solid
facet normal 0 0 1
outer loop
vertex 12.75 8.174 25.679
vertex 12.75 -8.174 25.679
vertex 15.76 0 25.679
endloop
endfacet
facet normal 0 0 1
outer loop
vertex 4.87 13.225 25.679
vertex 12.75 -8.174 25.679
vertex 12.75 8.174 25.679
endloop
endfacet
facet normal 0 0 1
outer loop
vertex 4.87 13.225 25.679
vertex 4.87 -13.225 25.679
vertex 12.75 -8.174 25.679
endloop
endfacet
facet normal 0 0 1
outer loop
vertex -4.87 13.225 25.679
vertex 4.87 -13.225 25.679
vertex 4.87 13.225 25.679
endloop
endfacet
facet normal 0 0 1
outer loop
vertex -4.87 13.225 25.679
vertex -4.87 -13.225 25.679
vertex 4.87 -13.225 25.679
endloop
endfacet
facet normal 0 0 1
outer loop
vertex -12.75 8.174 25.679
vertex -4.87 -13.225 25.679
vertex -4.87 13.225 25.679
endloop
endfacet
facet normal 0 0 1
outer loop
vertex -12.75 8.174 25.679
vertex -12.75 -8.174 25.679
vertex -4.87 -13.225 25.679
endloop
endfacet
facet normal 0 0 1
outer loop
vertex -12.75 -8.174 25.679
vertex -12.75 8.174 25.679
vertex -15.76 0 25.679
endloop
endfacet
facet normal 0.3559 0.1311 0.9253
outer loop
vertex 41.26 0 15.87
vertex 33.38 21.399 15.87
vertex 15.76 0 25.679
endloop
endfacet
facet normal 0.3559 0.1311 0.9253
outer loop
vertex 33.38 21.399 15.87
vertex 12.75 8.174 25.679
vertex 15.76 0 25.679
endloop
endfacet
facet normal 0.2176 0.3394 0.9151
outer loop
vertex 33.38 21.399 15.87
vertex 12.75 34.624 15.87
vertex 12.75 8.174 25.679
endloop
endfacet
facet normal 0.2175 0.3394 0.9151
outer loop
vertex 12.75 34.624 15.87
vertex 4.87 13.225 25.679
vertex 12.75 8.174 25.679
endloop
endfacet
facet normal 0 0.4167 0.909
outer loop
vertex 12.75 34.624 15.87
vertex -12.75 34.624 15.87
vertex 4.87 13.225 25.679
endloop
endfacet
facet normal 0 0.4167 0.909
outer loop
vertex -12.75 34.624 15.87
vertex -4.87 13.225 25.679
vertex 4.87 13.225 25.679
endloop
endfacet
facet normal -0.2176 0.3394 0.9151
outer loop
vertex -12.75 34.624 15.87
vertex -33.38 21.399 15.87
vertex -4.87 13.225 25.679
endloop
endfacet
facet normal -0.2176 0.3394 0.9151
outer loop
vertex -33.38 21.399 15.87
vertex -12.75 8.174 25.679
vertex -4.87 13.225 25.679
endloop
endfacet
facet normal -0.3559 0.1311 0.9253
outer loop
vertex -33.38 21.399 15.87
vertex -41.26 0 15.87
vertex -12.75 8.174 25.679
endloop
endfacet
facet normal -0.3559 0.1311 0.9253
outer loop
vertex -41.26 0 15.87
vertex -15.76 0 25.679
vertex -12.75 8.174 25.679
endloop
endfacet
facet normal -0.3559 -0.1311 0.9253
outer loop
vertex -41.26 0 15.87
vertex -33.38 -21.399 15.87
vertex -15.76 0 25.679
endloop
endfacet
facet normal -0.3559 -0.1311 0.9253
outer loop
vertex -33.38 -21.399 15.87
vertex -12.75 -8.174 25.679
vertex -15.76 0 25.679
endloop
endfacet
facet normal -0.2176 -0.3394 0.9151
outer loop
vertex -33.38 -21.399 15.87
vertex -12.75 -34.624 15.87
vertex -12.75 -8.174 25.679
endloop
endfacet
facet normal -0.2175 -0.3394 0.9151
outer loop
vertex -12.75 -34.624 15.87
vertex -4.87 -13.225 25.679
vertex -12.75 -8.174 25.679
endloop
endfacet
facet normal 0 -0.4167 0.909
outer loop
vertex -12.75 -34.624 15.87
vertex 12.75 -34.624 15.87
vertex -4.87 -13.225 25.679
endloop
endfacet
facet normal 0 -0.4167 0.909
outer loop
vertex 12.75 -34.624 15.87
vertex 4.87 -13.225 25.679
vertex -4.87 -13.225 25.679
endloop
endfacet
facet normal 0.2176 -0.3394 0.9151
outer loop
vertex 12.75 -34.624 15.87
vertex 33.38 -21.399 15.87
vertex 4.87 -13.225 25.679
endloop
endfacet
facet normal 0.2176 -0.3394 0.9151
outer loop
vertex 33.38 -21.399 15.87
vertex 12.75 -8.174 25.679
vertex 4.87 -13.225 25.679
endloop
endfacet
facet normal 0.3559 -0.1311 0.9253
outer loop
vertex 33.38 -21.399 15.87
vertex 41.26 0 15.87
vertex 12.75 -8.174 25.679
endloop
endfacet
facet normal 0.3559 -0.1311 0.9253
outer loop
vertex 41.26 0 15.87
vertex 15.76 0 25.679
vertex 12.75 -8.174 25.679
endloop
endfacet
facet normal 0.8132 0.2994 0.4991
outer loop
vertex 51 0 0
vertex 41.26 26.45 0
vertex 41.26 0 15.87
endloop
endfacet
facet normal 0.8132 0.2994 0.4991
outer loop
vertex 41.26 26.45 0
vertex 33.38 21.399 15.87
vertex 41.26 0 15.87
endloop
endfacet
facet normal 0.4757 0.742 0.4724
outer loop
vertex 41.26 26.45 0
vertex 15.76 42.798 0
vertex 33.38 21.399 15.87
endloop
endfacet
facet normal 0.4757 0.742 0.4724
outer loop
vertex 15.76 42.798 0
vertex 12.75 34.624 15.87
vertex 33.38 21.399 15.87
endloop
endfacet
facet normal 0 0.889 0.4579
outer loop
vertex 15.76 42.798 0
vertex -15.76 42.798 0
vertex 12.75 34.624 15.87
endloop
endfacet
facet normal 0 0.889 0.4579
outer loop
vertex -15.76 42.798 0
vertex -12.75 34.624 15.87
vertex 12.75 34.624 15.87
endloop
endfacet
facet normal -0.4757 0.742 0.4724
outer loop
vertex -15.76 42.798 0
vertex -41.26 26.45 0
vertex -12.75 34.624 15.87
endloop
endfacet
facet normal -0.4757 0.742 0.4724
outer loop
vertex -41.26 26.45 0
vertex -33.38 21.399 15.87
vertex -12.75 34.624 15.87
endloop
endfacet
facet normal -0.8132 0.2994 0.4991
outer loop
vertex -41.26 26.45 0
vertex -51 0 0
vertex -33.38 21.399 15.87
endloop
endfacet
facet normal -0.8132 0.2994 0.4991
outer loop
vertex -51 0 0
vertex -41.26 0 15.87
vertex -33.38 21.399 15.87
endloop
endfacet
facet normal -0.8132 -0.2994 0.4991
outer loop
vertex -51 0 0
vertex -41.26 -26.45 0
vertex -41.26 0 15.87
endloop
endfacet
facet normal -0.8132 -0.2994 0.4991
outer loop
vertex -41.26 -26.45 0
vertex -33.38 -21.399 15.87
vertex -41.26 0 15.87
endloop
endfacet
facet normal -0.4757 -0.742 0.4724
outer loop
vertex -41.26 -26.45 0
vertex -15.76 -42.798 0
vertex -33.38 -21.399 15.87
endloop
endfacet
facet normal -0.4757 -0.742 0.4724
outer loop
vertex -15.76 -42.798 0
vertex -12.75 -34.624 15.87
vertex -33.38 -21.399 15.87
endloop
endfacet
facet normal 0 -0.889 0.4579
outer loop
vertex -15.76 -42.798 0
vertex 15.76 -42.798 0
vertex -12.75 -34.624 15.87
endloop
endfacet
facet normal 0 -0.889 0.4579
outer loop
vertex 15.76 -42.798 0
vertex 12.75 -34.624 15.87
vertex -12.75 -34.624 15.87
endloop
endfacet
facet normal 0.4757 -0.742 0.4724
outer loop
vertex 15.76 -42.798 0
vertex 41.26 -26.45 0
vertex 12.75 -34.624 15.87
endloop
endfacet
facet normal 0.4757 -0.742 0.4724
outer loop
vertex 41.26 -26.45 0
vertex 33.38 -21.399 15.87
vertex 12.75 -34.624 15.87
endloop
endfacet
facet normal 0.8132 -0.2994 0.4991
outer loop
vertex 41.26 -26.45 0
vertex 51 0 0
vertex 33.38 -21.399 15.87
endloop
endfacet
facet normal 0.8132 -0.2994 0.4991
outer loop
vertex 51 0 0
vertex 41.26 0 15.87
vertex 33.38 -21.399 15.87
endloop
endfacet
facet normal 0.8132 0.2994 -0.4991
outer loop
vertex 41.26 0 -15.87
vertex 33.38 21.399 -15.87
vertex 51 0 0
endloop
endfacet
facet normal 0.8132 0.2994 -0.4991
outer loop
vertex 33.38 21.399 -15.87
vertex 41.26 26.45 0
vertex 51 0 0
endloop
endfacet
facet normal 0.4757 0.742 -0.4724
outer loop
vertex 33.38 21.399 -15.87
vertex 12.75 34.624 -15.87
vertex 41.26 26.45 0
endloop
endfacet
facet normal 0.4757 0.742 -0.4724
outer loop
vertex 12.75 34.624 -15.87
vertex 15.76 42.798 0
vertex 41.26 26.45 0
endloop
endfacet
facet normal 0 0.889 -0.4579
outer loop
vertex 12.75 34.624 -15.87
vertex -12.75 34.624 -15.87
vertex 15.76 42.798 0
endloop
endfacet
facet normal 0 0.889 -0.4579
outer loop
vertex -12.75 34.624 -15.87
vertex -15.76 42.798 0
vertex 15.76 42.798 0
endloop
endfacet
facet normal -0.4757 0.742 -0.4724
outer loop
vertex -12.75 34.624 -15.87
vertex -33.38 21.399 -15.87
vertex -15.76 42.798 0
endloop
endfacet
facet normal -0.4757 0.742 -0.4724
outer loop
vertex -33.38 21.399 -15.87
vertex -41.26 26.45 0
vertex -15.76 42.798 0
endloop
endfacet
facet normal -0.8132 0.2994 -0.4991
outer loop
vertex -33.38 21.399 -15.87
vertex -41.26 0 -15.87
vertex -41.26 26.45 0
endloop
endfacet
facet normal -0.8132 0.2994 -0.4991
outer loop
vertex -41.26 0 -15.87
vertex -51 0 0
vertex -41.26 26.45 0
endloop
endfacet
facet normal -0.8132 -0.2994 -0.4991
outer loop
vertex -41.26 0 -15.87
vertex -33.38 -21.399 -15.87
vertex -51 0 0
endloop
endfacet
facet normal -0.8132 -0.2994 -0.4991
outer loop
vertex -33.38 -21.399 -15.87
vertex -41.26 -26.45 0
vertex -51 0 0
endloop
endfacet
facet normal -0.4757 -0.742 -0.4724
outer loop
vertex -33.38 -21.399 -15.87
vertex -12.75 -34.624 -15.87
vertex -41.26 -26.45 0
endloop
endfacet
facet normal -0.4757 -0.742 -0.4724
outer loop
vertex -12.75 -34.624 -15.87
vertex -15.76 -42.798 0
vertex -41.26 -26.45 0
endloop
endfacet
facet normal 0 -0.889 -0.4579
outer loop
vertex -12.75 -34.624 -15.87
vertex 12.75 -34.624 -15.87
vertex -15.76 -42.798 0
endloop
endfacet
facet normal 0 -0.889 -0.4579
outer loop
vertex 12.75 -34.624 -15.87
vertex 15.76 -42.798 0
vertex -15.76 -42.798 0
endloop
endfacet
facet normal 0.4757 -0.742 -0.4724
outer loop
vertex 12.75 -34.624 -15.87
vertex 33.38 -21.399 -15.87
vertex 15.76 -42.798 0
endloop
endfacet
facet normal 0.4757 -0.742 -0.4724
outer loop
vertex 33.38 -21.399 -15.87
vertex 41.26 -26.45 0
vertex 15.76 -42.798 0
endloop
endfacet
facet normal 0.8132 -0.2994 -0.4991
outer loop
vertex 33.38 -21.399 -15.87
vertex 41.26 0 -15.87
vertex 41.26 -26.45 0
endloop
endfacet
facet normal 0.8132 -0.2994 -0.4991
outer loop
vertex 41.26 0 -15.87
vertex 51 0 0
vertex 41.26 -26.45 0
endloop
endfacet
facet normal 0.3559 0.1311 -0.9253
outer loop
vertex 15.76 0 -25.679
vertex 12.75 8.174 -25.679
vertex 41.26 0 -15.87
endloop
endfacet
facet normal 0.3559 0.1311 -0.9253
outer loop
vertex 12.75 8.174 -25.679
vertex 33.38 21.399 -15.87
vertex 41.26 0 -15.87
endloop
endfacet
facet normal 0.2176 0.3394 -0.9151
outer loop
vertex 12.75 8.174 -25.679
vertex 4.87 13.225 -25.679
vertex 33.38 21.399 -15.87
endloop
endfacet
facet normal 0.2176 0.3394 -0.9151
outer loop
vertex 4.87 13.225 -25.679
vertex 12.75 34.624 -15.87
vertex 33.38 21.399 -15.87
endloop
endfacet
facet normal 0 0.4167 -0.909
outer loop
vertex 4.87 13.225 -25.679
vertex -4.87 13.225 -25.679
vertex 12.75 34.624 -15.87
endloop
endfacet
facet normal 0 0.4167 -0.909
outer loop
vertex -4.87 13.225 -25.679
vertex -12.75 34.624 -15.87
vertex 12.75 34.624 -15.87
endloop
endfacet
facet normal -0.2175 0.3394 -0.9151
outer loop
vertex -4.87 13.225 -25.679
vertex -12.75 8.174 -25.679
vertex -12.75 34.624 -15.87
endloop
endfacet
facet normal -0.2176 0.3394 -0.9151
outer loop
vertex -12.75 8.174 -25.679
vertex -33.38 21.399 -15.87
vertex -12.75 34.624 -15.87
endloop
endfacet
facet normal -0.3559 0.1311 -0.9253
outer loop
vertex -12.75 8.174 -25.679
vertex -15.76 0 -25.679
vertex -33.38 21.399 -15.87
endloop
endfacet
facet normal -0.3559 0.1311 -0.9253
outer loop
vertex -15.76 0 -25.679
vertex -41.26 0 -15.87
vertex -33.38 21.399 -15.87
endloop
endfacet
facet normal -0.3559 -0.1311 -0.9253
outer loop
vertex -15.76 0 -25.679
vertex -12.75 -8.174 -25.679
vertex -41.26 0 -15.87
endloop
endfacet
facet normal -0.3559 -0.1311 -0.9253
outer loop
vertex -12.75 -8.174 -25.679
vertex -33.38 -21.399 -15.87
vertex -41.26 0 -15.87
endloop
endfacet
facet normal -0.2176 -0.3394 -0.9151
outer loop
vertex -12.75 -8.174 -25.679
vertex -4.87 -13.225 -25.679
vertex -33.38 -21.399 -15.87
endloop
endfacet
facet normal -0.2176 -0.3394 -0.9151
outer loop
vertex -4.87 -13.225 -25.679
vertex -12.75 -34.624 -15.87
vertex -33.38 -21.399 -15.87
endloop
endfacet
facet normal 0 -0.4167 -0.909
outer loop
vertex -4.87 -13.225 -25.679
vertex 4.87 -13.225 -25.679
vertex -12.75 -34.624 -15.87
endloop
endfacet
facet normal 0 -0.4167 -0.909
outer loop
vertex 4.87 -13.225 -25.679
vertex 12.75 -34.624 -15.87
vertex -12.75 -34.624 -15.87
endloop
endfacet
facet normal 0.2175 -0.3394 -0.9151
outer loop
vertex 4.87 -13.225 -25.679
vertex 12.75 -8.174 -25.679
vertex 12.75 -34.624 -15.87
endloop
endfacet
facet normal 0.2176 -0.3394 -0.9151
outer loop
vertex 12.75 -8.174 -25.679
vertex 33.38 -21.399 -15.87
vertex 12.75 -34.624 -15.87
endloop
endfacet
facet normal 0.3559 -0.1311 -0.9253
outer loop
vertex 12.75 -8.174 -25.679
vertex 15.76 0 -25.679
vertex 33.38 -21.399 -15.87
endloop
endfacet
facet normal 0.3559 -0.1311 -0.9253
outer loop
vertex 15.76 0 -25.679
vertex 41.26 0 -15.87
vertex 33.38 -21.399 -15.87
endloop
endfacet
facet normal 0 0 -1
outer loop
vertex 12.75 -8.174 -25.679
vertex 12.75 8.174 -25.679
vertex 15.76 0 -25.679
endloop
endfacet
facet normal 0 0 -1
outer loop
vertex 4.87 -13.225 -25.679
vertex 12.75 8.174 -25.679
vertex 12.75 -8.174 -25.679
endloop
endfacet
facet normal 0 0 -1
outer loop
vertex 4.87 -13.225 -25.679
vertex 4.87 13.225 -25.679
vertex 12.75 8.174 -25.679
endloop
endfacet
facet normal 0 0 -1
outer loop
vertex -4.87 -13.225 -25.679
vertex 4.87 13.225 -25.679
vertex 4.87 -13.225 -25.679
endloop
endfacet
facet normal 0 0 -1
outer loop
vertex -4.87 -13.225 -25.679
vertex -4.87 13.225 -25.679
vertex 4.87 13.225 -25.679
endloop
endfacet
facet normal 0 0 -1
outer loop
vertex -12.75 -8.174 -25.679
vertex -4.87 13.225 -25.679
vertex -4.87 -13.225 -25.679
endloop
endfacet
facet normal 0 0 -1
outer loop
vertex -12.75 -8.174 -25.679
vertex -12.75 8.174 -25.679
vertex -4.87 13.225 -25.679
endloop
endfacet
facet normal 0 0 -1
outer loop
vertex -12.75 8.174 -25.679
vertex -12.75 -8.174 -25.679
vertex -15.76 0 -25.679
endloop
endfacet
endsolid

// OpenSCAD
// Generated by SolidPython 1.0.1 on 2020-07-29 00:46:53


scale(v = [17, 15, 9]) {
	sphere(r = 3);
}
/***********************************************
*********      SolidPython code:      **********
************************************************
 
# import packages: SolidPython
from solid import *
from solid.utils import *
from itertools import chain, combinations, permutations


class Resize:

    def __init__(self, scad_file):
        self.scad_file = scad_file
        #self.scad_file = import_scad(scad_file)
        # cone/cylinder param:
        self.r1 = 0
        self.r2 = 0
        self.h = 0
        # rectangular prism param:
        self.w = 0
        self.l = 0
        # ellipse param:
        self.r = 0

    # import OpenScad code (file name corresponds to shape)


    # classify shape + parameters
    def assign(self, param1, param2, param3):
        if self.scad_file == 'cone.scad':
            self.r1 = param1
            self.r2 = param2
            self.h = param3
        elif self.scad_file == 'cylinder.scad':
            self.r1 = param1
            self.r2 = param2
            self.h = param3
        elif self.scad_file == 'rectangularPrism.scad':
            self.h = param1
            self.l = param2
            self.w = param3
        else:
            self.r = param1
            self.h = param2

    # resize parameters
    def iterate(self):
        x = range(3, 20, 2)
        i = 1
        if self.scad_file == 'cone.scad':
            tempList = list(permutations(x, 2))
            for temp in tempList:
                param1 = temp[0]
                param2 = temp[1]
                filepath = 'produced_scad_files/' + 'cone' + str(param1) + '_' + str(param2) + '_' + '.scad'
                scad_render_to_file(cylinder(h=param1, r1=param2, r2=0), filepath)

        elif self.scad_file == 'cylinder.scad':
            tempList = list(permutations(x, 3))
            for temp in tempList:
                param1 = temp[0]
                param2 = temp[1]
                filepath = 'produced_scad_files/' + 'cylinder' + str(param1) + '_' + str(param2) + '_' + '.scad'
                scad_render_to_file(cylinder(h=param1, r1=param2, r2=param2), filepath)

        elif self.scad_file == 'rectangularPrism.scad':
            tempList = list(permutations(x, 3))
            for temp in tempList:
                param1 = temp[0]
                param2 = temp[1]
                param3 = temp[2]
                filepath = 'produced_scad_files/' + 'rectangularPrism' + str(param1) + '_' + str(param2) + '_' + str(
                    param3) + '.scad'
                scad_render_to_file(cube(size=(param1, param2, param3)), filepath)

        elif self.scad_file == 'ellipse.scad':
            tempList = list(permutations(x, 4))
            for temp in tempList:
                param1 = temp[0]
                param2 = temp[1]
                param3 = temp[2]
                param4 = temp[3]
                filepath = 'produced_scad_files/' + 'ellipse' + str(param1) + '_' + str(param2) + '_' + str(param3) + '_' + str(param4) + '.scad'
                scad_render_to_file(scale([param1, param2, param3])(sphere(r=param4)), filepath)

    def render_to_scadfile(self):
        scad_render_to_file(scad, 'example.scad') 
 
************************************************/
